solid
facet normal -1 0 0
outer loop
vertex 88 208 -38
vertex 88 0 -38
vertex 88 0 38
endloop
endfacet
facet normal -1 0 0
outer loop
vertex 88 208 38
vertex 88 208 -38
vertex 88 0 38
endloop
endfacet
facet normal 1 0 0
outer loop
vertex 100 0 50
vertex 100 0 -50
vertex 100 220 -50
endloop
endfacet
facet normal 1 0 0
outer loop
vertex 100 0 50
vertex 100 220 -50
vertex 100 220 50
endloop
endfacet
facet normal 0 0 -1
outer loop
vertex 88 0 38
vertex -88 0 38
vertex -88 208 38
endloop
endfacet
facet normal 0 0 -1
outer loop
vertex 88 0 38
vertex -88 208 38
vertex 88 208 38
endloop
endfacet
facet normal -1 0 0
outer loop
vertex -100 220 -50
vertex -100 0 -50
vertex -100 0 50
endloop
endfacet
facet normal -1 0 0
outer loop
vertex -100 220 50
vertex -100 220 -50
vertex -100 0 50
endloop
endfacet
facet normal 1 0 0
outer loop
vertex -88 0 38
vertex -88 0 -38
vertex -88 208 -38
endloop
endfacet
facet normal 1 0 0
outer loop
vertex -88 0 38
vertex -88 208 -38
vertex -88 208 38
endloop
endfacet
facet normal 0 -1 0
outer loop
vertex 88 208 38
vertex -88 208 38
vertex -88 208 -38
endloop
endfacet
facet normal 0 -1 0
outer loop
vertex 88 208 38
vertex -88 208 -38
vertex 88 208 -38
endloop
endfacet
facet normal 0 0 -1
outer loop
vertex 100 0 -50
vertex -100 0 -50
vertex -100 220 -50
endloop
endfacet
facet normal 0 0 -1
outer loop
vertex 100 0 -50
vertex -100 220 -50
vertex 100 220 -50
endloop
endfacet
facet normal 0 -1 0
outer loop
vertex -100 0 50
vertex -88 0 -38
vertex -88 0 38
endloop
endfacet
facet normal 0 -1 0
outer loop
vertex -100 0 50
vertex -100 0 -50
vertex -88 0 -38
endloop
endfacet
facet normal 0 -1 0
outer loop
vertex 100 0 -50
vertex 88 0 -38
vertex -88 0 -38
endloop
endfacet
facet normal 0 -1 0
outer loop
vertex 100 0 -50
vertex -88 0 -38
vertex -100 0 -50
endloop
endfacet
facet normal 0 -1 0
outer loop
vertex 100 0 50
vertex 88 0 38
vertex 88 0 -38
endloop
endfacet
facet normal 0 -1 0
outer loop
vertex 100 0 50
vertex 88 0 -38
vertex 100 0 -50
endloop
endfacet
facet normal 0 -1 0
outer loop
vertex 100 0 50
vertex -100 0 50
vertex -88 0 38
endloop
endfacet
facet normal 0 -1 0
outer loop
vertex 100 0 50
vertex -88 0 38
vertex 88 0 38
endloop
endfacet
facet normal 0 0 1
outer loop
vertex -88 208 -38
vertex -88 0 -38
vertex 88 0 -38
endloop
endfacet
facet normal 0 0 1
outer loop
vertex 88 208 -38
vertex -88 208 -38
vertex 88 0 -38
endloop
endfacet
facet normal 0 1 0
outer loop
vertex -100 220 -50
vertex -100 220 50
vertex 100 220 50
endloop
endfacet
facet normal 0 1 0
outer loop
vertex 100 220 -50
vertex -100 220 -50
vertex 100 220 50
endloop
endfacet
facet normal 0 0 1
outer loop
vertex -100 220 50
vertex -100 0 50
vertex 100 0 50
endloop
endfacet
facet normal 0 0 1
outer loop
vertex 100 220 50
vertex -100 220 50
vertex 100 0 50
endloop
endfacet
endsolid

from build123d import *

# Parameters (mm, degrees)
F0_W     = 200
F0_H     = 100
F1_DEPTH = 220
F2_T     = -12


with BuildPart() as f1:
    # F0 (on Front) → F1 (new body)
    with BuildSketch(Plane.XZ):
        Rectangle(F0_W, F0_H)
    extrude(amount=-F1_DEPTH)

    # F2
    f2_openings = [f1.faces().sort_by_distance(p)[0] for p in [
        (0, 0, 0),
    ]]
    offset(amount=F2_T, openings=f2_openings)


solid = f1.part
